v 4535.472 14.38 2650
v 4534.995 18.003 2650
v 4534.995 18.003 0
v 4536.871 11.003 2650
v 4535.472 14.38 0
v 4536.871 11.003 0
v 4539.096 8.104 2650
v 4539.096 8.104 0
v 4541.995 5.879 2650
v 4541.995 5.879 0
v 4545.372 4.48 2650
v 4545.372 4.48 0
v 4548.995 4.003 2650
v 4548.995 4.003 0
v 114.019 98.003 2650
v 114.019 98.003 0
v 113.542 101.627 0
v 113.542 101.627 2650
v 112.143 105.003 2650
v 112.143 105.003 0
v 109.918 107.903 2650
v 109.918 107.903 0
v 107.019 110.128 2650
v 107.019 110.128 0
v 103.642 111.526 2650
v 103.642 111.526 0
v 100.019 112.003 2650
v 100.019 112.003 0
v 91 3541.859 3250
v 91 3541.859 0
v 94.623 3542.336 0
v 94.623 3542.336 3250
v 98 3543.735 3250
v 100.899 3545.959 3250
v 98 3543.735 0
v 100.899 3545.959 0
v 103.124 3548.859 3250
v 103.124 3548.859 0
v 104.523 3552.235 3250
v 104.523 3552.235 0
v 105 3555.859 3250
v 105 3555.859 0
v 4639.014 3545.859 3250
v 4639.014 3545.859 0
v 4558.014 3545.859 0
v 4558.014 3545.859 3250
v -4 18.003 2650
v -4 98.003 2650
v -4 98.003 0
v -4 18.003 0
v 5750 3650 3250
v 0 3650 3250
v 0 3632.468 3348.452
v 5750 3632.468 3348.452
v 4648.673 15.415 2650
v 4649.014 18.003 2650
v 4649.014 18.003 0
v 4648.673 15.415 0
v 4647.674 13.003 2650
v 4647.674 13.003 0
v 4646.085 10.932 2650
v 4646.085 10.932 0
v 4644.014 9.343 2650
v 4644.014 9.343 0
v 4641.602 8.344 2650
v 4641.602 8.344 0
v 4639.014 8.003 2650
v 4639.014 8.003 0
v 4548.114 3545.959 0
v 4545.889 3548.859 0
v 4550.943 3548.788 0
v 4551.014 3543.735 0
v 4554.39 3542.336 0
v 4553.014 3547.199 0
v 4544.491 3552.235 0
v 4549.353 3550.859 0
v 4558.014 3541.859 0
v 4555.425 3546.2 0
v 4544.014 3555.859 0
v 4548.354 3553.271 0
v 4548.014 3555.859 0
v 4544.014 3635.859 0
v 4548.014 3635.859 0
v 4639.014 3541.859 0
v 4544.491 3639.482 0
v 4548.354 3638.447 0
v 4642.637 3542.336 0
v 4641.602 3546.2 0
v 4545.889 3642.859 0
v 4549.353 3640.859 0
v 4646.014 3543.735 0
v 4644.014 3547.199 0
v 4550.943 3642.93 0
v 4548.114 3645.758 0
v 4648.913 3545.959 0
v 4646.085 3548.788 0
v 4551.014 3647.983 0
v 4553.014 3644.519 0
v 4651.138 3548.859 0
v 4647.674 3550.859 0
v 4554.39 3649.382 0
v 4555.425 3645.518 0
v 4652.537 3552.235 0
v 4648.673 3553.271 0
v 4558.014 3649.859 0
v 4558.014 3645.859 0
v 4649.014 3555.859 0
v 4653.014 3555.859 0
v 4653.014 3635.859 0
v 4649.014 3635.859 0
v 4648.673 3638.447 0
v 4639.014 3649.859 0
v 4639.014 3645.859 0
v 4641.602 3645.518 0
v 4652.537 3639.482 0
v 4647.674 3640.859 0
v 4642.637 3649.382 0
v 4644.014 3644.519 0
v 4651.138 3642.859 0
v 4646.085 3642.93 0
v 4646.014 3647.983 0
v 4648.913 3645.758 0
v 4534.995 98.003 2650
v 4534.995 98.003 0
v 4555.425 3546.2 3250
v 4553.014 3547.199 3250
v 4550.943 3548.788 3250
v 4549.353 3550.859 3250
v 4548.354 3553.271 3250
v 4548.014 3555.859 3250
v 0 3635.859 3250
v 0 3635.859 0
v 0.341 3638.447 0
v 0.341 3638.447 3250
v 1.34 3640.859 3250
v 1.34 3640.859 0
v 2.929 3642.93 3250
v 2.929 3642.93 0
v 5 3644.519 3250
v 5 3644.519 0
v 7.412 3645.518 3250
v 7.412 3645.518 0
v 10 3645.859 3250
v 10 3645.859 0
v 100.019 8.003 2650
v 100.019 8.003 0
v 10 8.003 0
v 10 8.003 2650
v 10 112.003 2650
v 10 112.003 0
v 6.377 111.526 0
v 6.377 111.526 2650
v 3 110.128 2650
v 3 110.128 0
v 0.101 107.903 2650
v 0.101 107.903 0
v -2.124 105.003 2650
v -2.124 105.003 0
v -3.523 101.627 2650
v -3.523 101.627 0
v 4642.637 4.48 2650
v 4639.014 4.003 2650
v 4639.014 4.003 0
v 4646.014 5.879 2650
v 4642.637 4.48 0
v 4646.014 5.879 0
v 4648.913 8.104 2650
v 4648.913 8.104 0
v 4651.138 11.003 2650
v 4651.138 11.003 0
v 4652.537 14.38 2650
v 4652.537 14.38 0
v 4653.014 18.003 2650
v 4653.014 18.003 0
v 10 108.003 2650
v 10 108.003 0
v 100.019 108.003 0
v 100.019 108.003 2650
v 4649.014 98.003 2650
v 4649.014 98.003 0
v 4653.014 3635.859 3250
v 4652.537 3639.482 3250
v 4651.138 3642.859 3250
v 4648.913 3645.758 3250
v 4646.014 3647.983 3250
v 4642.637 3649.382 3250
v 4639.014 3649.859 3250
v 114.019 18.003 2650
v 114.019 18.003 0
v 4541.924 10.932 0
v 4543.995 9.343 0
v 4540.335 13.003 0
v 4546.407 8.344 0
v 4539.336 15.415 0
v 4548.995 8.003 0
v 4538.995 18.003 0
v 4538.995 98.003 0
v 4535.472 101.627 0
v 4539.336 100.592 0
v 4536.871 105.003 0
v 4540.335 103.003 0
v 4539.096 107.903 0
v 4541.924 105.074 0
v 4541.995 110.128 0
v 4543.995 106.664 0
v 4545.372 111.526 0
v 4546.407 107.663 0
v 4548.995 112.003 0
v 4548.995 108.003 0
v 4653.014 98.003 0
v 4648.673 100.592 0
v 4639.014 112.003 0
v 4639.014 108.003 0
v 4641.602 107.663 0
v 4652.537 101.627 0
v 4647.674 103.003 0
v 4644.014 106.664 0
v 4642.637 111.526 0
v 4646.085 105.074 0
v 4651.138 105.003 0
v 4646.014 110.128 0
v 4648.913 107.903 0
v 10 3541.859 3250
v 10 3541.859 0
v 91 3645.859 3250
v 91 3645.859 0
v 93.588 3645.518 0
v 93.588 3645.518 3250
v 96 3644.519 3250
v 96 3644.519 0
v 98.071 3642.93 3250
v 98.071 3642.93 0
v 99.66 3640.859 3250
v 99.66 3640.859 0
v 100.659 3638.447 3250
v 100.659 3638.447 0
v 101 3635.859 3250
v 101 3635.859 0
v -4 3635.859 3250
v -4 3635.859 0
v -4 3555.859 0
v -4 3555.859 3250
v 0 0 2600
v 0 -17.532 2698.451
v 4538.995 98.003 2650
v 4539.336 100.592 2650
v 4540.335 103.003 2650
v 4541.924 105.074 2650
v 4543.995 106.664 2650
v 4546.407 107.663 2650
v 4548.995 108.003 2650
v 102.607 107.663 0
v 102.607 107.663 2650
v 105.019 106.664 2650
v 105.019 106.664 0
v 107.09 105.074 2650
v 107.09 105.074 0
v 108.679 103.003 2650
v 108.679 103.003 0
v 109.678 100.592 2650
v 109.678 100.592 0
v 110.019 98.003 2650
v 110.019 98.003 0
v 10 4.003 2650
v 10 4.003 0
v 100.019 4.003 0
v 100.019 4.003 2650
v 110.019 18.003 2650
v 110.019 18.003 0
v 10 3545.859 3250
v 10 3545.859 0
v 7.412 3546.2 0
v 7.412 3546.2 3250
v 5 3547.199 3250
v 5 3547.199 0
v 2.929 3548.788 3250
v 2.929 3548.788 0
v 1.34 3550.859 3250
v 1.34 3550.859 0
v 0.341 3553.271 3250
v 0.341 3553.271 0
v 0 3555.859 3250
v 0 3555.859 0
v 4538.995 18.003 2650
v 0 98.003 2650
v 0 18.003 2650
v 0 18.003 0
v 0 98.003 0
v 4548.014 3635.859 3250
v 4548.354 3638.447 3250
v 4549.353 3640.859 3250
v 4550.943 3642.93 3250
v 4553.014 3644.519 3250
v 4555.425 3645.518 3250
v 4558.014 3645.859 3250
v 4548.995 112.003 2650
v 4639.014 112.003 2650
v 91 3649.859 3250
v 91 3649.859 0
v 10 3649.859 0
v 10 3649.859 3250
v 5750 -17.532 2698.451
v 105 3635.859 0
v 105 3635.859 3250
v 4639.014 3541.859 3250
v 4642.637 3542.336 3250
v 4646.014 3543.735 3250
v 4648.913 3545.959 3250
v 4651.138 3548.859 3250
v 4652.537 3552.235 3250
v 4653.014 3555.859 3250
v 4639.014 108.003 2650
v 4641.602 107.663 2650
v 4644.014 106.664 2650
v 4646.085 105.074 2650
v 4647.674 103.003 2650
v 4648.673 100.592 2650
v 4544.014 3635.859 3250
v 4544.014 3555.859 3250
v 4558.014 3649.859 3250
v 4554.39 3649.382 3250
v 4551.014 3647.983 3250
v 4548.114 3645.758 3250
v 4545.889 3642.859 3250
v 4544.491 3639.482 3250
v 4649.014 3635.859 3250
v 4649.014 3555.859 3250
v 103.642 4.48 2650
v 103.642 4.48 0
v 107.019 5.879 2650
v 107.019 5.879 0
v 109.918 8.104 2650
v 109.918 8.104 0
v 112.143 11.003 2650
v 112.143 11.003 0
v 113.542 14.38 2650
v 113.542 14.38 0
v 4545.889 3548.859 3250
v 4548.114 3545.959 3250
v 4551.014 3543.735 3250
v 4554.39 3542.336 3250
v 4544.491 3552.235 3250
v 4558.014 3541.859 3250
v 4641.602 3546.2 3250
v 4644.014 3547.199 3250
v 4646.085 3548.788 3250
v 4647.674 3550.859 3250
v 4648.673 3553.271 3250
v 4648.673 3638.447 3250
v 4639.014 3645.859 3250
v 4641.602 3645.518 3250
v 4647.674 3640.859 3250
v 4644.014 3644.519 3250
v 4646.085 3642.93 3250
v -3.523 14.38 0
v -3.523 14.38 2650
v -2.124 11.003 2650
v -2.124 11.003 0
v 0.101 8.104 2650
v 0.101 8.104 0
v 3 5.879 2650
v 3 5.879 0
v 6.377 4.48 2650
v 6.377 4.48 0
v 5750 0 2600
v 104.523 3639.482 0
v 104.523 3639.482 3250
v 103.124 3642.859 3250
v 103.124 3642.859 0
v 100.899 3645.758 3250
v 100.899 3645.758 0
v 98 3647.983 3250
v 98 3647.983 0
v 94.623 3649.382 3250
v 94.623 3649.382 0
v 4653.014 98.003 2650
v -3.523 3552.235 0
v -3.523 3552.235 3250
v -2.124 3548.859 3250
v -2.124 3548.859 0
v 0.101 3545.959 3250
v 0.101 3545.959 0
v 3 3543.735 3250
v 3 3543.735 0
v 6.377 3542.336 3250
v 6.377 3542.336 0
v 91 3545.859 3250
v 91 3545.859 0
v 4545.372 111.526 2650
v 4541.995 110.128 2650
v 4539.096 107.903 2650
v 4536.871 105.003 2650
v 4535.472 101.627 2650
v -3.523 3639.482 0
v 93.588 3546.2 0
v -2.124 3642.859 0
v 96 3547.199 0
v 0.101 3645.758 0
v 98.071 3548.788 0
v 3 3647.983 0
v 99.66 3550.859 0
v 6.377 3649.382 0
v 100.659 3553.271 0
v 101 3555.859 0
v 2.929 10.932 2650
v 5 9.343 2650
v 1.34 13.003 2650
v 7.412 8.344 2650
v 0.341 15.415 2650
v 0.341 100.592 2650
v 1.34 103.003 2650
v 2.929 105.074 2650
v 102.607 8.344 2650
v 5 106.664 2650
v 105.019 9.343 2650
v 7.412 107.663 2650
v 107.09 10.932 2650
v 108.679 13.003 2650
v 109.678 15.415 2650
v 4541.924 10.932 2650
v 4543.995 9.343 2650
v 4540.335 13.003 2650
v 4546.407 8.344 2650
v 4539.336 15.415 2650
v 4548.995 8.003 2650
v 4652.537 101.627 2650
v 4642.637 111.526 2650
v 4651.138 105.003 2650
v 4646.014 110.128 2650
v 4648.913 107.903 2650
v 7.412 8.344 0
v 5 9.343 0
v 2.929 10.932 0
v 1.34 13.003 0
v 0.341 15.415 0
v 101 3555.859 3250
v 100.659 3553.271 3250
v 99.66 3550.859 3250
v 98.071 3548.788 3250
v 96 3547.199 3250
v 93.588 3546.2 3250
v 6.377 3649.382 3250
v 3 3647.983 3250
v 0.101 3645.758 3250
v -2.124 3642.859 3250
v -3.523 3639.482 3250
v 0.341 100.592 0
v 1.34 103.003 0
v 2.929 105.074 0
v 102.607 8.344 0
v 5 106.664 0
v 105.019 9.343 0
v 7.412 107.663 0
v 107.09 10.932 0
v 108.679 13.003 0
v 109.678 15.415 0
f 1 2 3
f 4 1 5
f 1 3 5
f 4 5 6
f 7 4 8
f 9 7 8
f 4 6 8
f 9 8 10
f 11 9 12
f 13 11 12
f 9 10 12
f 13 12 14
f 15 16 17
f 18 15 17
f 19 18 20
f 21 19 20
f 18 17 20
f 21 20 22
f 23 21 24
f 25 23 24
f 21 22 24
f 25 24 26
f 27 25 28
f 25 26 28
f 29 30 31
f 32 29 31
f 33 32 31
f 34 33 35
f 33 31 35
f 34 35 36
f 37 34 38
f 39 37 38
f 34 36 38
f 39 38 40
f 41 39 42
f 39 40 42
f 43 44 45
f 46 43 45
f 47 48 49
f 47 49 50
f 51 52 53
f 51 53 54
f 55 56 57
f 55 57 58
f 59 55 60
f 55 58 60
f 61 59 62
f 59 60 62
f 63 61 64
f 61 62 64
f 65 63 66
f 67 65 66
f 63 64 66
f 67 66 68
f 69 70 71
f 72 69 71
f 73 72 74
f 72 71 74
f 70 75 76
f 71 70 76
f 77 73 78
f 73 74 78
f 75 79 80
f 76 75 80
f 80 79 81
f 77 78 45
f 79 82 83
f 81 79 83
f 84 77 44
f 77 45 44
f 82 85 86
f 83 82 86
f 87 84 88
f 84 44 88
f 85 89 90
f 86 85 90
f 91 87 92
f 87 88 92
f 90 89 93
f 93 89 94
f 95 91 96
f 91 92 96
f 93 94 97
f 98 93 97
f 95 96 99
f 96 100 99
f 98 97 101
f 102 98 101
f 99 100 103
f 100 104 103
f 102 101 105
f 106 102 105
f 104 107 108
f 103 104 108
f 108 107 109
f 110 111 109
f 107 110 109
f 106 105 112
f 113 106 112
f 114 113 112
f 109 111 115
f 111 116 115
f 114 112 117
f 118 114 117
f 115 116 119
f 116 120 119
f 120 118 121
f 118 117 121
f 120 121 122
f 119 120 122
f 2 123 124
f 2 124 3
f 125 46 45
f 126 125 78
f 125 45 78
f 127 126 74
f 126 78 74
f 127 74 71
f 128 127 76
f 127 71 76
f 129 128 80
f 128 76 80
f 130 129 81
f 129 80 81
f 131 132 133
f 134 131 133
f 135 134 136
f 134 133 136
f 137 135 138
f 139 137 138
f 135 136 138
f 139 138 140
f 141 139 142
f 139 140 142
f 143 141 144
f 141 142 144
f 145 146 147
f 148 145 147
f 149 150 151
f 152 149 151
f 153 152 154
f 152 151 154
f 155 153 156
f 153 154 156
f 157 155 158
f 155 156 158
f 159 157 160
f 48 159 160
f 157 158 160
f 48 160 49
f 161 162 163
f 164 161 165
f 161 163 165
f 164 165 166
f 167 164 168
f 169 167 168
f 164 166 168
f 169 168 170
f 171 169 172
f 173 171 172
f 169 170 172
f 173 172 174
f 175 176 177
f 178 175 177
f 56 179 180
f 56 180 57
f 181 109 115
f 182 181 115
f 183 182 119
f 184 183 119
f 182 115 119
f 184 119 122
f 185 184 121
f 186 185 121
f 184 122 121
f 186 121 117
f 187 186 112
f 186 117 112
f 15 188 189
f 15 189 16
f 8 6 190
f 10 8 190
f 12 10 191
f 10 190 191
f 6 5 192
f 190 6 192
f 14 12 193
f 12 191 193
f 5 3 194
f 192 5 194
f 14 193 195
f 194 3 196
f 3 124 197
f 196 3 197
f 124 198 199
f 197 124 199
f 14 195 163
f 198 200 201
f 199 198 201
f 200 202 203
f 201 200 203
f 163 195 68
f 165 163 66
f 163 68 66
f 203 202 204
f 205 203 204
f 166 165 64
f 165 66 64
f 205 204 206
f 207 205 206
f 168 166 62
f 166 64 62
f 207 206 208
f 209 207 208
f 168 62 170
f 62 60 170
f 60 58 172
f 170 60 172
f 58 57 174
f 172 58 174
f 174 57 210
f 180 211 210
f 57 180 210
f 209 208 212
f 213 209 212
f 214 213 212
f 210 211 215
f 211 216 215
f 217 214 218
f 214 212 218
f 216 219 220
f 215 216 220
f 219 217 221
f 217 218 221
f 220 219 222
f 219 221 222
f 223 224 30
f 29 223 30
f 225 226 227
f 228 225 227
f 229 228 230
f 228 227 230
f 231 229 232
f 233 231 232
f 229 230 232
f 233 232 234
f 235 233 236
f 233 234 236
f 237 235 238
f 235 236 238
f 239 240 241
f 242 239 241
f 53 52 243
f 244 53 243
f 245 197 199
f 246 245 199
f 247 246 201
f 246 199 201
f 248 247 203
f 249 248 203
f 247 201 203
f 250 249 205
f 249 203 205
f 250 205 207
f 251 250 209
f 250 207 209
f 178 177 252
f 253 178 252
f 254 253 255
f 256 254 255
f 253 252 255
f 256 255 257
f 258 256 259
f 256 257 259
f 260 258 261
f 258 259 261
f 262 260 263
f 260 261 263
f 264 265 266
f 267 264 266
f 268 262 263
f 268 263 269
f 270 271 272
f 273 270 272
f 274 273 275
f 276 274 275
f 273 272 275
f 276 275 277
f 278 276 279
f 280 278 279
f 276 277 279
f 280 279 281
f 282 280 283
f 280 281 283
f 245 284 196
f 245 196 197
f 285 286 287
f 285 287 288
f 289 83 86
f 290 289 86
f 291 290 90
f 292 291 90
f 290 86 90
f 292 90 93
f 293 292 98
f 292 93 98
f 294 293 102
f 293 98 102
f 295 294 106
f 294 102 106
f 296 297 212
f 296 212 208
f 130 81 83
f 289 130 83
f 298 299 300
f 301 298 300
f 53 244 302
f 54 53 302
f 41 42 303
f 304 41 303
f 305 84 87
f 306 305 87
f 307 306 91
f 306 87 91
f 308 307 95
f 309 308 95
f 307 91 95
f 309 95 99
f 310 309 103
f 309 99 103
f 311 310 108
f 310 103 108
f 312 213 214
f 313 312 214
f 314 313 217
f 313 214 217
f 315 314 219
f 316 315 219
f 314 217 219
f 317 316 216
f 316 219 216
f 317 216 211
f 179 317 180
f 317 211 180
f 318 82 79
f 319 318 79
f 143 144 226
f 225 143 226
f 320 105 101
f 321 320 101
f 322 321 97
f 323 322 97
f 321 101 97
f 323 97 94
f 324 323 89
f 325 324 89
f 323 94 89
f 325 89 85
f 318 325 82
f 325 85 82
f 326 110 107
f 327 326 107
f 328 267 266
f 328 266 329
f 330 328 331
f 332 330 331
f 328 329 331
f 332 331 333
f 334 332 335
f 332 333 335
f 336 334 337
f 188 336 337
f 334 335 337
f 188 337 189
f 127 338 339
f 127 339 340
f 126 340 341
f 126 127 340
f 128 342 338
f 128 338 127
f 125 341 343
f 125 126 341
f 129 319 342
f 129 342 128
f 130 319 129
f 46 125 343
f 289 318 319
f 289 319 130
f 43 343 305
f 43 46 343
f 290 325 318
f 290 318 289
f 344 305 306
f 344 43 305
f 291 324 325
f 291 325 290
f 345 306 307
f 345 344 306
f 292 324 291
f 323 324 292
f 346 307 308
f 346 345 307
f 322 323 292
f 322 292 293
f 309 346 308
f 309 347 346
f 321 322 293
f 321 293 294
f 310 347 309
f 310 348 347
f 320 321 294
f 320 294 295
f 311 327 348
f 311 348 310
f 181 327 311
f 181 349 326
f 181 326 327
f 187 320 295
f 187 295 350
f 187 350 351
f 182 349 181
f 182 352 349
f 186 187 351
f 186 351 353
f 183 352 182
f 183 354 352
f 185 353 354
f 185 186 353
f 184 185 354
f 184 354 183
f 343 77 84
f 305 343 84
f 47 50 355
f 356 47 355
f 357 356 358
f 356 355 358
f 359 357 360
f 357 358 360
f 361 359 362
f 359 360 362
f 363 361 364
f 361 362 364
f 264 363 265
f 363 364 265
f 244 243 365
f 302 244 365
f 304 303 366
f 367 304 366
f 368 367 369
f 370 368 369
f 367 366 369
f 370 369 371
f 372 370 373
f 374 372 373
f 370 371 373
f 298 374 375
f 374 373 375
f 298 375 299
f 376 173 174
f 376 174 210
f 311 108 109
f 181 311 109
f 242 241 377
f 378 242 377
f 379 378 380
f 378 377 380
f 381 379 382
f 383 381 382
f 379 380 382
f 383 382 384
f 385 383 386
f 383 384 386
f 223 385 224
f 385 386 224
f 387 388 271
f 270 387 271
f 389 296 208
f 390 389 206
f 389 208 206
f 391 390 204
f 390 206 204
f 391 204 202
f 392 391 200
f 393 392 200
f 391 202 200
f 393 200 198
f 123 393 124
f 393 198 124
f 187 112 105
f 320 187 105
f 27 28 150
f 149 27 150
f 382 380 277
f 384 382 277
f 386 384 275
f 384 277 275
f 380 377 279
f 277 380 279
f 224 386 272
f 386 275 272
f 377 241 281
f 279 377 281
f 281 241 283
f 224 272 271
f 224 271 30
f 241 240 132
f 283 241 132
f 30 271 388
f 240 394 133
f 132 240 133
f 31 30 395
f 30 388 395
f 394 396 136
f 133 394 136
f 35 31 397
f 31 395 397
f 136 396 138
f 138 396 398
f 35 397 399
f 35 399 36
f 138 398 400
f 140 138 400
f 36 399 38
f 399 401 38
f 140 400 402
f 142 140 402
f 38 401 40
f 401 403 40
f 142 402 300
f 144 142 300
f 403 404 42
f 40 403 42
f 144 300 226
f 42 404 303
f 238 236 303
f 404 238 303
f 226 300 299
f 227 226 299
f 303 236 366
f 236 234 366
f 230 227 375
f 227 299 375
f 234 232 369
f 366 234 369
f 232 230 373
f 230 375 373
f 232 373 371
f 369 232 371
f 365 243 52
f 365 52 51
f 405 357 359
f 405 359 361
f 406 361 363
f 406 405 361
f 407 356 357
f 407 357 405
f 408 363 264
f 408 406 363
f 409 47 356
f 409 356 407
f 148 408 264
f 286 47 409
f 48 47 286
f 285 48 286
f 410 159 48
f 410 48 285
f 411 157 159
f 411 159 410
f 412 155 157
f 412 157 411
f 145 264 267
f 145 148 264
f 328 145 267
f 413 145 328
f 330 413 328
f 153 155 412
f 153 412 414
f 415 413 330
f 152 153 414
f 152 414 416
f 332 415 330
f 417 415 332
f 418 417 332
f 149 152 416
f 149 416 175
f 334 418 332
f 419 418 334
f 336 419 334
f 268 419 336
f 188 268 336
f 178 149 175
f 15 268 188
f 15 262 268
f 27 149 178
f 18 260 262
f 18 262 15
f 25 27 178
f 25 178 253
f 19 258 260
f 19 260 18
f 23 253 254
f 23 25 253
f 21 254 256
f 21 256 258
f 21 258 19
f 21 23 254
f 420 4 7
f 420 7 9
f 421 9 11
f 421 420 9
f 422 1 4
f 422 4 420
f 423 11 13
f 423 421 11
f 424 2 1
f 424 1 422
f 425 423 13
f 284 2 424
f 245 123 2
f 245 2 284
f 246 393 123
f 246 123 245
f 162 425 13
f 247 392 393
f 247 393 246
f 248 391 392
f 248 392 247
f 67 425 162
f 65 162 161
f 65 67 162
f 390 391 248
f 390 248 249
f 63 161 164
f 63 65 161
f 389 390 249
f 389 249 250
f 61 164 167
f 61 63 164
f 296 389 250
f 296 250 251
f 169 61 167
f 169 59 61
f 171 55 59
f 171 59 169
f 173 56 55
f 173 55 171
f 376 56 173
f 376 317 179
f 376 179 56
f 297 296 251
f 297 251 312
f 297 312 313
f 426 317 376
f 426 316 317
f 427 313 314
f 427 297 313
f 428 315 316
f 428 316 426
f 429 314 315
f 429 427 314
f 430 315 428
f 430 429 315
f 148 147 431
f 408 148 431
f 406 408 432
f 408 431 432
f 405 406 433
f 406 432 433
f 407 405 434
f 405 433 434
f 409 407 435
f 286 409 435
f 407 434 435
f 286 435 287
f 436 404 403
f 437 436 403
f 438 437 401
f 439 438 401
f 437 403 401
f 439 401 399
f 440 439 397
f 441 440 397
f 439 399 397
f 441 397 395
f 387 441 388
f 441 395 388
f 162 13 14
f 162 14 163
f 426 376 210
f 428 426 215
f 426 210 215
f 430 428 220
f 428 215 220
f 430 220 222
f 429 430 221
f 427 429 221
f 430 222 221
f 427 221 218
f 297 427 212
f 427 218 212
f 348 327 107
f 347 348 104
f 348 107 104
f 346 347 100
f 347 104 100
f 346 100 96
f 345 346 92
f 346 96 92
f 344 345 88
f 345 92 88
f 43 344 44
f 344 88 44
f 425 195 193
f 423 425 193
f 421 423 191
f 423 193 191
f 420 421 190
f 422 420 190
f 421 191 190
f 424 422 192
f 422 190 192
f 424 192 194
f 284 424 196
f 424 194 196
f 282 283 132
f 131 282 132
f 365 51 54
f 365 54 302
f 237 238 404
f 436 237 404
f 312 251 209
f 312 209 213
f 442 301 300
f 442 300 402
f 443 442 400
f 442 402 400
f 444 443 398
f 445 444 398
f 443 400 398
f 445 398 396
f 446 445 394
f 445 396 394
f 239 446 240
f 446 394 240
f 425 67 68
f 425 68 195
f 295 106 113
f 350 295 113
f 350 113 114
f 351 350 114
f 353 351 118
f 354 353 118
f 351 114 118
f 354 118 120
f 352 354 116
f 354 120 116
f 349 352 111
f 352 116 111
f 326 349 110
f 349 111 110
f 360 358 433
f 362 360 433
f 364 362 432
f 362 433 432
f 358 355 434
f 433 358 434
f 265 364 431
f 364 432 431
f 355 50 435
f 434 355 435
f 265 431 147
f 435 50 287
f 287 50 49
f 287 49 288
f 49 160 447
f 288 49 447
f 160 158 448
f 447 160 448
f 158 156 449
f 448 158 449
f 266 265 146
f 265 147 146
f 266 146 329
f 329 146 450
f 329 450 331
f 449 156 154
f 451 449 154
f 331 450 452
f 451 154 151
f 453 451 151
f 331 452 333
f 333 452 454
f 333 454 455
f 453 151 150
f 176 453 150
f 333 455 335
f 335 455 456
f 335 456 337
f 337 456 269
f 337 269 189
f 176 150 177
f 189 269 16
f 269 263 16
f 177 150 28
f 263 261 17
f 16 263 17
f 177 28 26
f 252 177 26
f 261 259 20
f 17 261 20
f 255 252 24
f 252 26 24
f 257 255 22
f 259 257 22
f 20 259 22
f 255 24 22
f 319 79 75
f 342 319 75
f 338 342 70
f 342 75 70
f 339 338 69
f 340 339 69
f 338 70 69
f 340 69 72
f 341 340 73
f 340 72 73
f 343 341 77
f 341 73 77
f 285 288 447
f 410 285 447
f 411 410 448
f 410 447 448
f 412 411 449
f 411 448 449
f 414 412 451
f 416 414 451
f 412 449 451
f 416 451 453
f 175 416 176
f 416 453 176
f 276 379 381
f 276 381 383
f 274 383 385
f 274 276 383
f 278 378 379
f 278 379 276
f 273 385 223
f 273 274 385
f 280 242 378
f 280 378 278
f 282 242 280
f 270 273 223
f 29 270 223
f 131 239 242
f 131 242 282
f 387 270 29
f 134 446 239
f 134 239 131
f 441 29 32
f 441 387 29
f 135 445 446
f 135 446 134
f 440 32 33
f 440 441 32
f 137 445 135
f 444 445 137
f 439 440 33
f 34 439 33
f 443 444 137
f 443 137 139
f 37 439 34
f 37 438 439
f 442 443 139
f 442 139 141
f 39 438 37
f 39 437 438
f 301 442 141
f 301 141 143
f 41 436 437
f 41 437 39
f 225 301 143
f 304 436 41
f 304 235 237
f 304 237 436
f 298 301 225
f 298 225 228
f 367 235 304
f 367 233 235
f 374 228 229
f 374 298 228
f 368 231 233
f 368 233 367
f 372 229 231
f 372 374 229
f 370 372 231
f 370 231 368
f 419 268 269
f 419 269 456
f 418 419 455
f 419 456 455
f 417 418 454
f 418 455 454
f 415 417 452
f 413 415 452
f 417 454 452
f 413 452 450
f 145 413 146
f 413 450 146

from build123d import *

# Parameters (mm, degrees)
F11_W     = 5750
F11_H     = 3707.424982
F12_DEPTH = 100
F13_DEPTH = 2650
F14_DEPTH = 3250


with BuildPart() as f12:
    # F11 (on face) → F12 (new body)
    with BuildSketch(Plane(origin=(0, -448.781375, 2520.080029), x_dir=(1, 0, 0), z_dir=(0, 0.175324, -0.984511))):
        with Locations((2875, -2309.554486)):
            Rectangle(F11_W, F11_H)
    extrude(amount=-F12_DEPTH)


with BuildPart() as f13:
    # F3 (on Top) → F13 (new body)
    with BuildSketch(Plane.XY):
        with BuildLine():
            Line((10, 4.003398), (100.018654, 4.003398))
            ThreePointArc((100.018654, 4.003398), (109.918148, 8.103903), (114.018654, 18.003398))
            Line((114.018654, 18.003398), (114.018654, 98.003398))
            ThreePointArc((114.018654, 98.003398), (109.918148, 107.902893), (100.018654, 112.003398))
            Line((100.018654, 112.003398), (10, 112.003398))
            ThreePointArc((10, 112.003398), (0.100505, 107.902893), (-4, 98.003398))
            Line((-4, 98.003398), (-4, 18.003398))
            ThreePointArc((-4, 18.003398), (0.100505, 8.103903), (10, 4.003398))
        make_face()
        with BuildLine():
            Line((100.018654, 8.003398), (10, 8.003398))
            ThreePointArc((10, 8.003398), (2.928932, 10.93233), (0, 18.003398))
            Line((0, 18.003398), (0, 98.003398))
            ThreePointArc((0, 98.003398), (2.928932, 105.074466), (10, 108.003398))
            Line((10, 108.003398), (100.018654, 108.003398))
            ThreePointArc((100.018654, 108.003398), (107.089721, 105.074466), (110.018654, 98.003398))
            Line((110.018654, 98.003398), (110.018654, 18.003398))
            ThreePointArc((110.018654, 18.003398), (107.089721, 10.93233), (100.018654, 8.003398))
        make_face(mode=Mode.SUBTRACT)
        with BuildLine():
            Line((4548.995011, 4.003398), (4639.013664, 4.003398))
            ThreePointArc((4639.013664, 4.003398), (4648.913159, 8.103903), (4653.013664, 18.003398))
            Line((4653.013664, 18.003398), (4653.013664, 98.003398))
            ThreePointArc((4653.013664, 98.003398), (4648.913159, 107.902893), (4639.013664, 112.003398))
            Line((4639.013664, 112.003398), (4548.995011, 112.003398))
            ThreePointArc((4548.995011, 112.003398), (4539.095516, 107.902893), (4534.995011, 98.003398))
            Line((4534.995011, 98.003398), (4534.995011, 18.003398))
            ThreePointArc((4534.995011, 18.003398), (4539.095516, 8.103903), (4548.995011, 4.003398))
        make_face()
        with BuildLine():
            Line((4639.013664, 8.003398), (4548.995011, 8.003398))
            ThreePointArc((4548.995011, 8.003398), (4541.923943, 10.93233), (4538.995011, 18.003398))
            Line((4538.995011, 18.003398), (4538.995011, 98.003398))
            ThreePointArc((4538.995011, 98.003398), (4541.923943, 105.074466), (4548.995011, 108.003398))
            Line((4548.995011, 108.003398), (4639.013664, 108.003398))
            ThreePointArc((4639.013664, 108.003398), (4646.084732, 105.074466), (4649.013664, 98.003398))
            Line((4649.013664, 98.003398), (4649.013664, 18.003398))
            ThreePointArc((4649.013664, 18.003398), (4646.084732, 10.93233), (4639.013664, 8.003398))
        make_face(mode=Mode.SUBTRACT)
    extrude(amount=F13_DEPTH)


with BuildPart() as f14:
    # F3 (on Top) → F14 (new body)
    with BuildSketch(Plane.XY):
        with BuildLine():
            Line((10, 3541.85886), (91, 3541.85886))
            ThreePointArc((91, 3541.85886), (100.899495, 3545.959365), (105, 3555.85886))
            Line((105, 3555.85886), (105, 3635.85886))
            ThreePointArc((105, 3635.85886), (100.899495, 3645.758355), (91, 3649.85886))
            Line((91, 3649.85886), (10, 3649.85886))
            ThreePointArc((10, 3649.85886), (0.100505, 3645.758355), (-4, 3635.85886))
            Line((-4, 3635.85886), (-4, 3555.85886))
            ThreePointArc((-4, 3555.85886), (0.100505, 3545.959365), (10, 3541.85886))
        make_face()
        with BuildLine():
            Line((91, 3545.85886), (10, 3545.85886))
            ThreePointArc((10, 3545.85886), (2.928932, 3548.787792), (0, 3555.85886))
            Line((0, 3555.85886), (0, 3635.85886))
            ThreePointArc((0, 3635.85886), (2.928932, 3642.929928), (10, 3645.85886))
            Line((10, 3645.85886), (91, 3645.85886))
            ThreePointArc((91, 3645.85886), (98.071068, 3642.929928), (101, 3635.85886))
            Line((101, 3635.85886), (101, 3555.85886))
            ThreePointArc((101, 3555.85886), (98.071068, 3548.787792), (91, 3545.85886))
        make_face(mode=Mode.SUBTRACT)
        with BuildLine():
            Line((4558.013664, 3541.85886), (4639.013664, 3541.85886))
            ThreePointArc((4639.013664, 3541.85886), (4648.913159, 3545.959365), (4653.013664, 3555.85886))
            Line((4653.013664, 3555.85886), (4653.013664, 3635.85886))
            ThreePointArc((4653.013664, 3635.85886), (4648.913159, 3645.758355), (4639.013664, 3649.85886))
            Line((4639.013664, 3649.85886), (4558.013664, 3649.85886))
            ThreePointArc((4558.013664, 3649.85886), (4548.114169, 3645.758355), (4544.013664, 3635.85886))
            Line((4544.013664, 3635.85886), (4544.013664, 3555.85886))
            ThreePointArc((4544.013664, 3555.85886), (4548.114169, 3545.959365), (4558.013664, 3541.85886))
        make_face()
        with BuildLine():
            Line((4639.013664, 3545.85886), (4558.013664, 3545.85886))
            ThreePointArc((4558.013664, 3545.85886), (4550.942596, 3548.787792), (4548.013664, 3555.85886))
            Line((4548.013664, 3555.85886), (4548.013664, 3635.85886))
            ThreePointArc((4548.013664, 3635.85886), (4550.942596, 3642.929928), (4558.013664, 3645.85886))
            Line((4558.013664, 3645.85886), (4639.013664, 3645.85886))
            ThreePointArc((4639.013664, 3645.85886), (4646.084732, 3642.929928), (4649.013664, 3635.85886))
            Line((4649.013664, 3635.85886), (4649.013664, 3555.85886))
            ThreePointArc((4649.013664, 3555.85886), (4646.084732, 3548.787792), (4639.013664, 3545.85886))
        make_face(mode=Mode.SUBTRACT)
    extrude(amount=F14_DEPTH)


solid = Compound([f12.part, f13.part, f14.part])
